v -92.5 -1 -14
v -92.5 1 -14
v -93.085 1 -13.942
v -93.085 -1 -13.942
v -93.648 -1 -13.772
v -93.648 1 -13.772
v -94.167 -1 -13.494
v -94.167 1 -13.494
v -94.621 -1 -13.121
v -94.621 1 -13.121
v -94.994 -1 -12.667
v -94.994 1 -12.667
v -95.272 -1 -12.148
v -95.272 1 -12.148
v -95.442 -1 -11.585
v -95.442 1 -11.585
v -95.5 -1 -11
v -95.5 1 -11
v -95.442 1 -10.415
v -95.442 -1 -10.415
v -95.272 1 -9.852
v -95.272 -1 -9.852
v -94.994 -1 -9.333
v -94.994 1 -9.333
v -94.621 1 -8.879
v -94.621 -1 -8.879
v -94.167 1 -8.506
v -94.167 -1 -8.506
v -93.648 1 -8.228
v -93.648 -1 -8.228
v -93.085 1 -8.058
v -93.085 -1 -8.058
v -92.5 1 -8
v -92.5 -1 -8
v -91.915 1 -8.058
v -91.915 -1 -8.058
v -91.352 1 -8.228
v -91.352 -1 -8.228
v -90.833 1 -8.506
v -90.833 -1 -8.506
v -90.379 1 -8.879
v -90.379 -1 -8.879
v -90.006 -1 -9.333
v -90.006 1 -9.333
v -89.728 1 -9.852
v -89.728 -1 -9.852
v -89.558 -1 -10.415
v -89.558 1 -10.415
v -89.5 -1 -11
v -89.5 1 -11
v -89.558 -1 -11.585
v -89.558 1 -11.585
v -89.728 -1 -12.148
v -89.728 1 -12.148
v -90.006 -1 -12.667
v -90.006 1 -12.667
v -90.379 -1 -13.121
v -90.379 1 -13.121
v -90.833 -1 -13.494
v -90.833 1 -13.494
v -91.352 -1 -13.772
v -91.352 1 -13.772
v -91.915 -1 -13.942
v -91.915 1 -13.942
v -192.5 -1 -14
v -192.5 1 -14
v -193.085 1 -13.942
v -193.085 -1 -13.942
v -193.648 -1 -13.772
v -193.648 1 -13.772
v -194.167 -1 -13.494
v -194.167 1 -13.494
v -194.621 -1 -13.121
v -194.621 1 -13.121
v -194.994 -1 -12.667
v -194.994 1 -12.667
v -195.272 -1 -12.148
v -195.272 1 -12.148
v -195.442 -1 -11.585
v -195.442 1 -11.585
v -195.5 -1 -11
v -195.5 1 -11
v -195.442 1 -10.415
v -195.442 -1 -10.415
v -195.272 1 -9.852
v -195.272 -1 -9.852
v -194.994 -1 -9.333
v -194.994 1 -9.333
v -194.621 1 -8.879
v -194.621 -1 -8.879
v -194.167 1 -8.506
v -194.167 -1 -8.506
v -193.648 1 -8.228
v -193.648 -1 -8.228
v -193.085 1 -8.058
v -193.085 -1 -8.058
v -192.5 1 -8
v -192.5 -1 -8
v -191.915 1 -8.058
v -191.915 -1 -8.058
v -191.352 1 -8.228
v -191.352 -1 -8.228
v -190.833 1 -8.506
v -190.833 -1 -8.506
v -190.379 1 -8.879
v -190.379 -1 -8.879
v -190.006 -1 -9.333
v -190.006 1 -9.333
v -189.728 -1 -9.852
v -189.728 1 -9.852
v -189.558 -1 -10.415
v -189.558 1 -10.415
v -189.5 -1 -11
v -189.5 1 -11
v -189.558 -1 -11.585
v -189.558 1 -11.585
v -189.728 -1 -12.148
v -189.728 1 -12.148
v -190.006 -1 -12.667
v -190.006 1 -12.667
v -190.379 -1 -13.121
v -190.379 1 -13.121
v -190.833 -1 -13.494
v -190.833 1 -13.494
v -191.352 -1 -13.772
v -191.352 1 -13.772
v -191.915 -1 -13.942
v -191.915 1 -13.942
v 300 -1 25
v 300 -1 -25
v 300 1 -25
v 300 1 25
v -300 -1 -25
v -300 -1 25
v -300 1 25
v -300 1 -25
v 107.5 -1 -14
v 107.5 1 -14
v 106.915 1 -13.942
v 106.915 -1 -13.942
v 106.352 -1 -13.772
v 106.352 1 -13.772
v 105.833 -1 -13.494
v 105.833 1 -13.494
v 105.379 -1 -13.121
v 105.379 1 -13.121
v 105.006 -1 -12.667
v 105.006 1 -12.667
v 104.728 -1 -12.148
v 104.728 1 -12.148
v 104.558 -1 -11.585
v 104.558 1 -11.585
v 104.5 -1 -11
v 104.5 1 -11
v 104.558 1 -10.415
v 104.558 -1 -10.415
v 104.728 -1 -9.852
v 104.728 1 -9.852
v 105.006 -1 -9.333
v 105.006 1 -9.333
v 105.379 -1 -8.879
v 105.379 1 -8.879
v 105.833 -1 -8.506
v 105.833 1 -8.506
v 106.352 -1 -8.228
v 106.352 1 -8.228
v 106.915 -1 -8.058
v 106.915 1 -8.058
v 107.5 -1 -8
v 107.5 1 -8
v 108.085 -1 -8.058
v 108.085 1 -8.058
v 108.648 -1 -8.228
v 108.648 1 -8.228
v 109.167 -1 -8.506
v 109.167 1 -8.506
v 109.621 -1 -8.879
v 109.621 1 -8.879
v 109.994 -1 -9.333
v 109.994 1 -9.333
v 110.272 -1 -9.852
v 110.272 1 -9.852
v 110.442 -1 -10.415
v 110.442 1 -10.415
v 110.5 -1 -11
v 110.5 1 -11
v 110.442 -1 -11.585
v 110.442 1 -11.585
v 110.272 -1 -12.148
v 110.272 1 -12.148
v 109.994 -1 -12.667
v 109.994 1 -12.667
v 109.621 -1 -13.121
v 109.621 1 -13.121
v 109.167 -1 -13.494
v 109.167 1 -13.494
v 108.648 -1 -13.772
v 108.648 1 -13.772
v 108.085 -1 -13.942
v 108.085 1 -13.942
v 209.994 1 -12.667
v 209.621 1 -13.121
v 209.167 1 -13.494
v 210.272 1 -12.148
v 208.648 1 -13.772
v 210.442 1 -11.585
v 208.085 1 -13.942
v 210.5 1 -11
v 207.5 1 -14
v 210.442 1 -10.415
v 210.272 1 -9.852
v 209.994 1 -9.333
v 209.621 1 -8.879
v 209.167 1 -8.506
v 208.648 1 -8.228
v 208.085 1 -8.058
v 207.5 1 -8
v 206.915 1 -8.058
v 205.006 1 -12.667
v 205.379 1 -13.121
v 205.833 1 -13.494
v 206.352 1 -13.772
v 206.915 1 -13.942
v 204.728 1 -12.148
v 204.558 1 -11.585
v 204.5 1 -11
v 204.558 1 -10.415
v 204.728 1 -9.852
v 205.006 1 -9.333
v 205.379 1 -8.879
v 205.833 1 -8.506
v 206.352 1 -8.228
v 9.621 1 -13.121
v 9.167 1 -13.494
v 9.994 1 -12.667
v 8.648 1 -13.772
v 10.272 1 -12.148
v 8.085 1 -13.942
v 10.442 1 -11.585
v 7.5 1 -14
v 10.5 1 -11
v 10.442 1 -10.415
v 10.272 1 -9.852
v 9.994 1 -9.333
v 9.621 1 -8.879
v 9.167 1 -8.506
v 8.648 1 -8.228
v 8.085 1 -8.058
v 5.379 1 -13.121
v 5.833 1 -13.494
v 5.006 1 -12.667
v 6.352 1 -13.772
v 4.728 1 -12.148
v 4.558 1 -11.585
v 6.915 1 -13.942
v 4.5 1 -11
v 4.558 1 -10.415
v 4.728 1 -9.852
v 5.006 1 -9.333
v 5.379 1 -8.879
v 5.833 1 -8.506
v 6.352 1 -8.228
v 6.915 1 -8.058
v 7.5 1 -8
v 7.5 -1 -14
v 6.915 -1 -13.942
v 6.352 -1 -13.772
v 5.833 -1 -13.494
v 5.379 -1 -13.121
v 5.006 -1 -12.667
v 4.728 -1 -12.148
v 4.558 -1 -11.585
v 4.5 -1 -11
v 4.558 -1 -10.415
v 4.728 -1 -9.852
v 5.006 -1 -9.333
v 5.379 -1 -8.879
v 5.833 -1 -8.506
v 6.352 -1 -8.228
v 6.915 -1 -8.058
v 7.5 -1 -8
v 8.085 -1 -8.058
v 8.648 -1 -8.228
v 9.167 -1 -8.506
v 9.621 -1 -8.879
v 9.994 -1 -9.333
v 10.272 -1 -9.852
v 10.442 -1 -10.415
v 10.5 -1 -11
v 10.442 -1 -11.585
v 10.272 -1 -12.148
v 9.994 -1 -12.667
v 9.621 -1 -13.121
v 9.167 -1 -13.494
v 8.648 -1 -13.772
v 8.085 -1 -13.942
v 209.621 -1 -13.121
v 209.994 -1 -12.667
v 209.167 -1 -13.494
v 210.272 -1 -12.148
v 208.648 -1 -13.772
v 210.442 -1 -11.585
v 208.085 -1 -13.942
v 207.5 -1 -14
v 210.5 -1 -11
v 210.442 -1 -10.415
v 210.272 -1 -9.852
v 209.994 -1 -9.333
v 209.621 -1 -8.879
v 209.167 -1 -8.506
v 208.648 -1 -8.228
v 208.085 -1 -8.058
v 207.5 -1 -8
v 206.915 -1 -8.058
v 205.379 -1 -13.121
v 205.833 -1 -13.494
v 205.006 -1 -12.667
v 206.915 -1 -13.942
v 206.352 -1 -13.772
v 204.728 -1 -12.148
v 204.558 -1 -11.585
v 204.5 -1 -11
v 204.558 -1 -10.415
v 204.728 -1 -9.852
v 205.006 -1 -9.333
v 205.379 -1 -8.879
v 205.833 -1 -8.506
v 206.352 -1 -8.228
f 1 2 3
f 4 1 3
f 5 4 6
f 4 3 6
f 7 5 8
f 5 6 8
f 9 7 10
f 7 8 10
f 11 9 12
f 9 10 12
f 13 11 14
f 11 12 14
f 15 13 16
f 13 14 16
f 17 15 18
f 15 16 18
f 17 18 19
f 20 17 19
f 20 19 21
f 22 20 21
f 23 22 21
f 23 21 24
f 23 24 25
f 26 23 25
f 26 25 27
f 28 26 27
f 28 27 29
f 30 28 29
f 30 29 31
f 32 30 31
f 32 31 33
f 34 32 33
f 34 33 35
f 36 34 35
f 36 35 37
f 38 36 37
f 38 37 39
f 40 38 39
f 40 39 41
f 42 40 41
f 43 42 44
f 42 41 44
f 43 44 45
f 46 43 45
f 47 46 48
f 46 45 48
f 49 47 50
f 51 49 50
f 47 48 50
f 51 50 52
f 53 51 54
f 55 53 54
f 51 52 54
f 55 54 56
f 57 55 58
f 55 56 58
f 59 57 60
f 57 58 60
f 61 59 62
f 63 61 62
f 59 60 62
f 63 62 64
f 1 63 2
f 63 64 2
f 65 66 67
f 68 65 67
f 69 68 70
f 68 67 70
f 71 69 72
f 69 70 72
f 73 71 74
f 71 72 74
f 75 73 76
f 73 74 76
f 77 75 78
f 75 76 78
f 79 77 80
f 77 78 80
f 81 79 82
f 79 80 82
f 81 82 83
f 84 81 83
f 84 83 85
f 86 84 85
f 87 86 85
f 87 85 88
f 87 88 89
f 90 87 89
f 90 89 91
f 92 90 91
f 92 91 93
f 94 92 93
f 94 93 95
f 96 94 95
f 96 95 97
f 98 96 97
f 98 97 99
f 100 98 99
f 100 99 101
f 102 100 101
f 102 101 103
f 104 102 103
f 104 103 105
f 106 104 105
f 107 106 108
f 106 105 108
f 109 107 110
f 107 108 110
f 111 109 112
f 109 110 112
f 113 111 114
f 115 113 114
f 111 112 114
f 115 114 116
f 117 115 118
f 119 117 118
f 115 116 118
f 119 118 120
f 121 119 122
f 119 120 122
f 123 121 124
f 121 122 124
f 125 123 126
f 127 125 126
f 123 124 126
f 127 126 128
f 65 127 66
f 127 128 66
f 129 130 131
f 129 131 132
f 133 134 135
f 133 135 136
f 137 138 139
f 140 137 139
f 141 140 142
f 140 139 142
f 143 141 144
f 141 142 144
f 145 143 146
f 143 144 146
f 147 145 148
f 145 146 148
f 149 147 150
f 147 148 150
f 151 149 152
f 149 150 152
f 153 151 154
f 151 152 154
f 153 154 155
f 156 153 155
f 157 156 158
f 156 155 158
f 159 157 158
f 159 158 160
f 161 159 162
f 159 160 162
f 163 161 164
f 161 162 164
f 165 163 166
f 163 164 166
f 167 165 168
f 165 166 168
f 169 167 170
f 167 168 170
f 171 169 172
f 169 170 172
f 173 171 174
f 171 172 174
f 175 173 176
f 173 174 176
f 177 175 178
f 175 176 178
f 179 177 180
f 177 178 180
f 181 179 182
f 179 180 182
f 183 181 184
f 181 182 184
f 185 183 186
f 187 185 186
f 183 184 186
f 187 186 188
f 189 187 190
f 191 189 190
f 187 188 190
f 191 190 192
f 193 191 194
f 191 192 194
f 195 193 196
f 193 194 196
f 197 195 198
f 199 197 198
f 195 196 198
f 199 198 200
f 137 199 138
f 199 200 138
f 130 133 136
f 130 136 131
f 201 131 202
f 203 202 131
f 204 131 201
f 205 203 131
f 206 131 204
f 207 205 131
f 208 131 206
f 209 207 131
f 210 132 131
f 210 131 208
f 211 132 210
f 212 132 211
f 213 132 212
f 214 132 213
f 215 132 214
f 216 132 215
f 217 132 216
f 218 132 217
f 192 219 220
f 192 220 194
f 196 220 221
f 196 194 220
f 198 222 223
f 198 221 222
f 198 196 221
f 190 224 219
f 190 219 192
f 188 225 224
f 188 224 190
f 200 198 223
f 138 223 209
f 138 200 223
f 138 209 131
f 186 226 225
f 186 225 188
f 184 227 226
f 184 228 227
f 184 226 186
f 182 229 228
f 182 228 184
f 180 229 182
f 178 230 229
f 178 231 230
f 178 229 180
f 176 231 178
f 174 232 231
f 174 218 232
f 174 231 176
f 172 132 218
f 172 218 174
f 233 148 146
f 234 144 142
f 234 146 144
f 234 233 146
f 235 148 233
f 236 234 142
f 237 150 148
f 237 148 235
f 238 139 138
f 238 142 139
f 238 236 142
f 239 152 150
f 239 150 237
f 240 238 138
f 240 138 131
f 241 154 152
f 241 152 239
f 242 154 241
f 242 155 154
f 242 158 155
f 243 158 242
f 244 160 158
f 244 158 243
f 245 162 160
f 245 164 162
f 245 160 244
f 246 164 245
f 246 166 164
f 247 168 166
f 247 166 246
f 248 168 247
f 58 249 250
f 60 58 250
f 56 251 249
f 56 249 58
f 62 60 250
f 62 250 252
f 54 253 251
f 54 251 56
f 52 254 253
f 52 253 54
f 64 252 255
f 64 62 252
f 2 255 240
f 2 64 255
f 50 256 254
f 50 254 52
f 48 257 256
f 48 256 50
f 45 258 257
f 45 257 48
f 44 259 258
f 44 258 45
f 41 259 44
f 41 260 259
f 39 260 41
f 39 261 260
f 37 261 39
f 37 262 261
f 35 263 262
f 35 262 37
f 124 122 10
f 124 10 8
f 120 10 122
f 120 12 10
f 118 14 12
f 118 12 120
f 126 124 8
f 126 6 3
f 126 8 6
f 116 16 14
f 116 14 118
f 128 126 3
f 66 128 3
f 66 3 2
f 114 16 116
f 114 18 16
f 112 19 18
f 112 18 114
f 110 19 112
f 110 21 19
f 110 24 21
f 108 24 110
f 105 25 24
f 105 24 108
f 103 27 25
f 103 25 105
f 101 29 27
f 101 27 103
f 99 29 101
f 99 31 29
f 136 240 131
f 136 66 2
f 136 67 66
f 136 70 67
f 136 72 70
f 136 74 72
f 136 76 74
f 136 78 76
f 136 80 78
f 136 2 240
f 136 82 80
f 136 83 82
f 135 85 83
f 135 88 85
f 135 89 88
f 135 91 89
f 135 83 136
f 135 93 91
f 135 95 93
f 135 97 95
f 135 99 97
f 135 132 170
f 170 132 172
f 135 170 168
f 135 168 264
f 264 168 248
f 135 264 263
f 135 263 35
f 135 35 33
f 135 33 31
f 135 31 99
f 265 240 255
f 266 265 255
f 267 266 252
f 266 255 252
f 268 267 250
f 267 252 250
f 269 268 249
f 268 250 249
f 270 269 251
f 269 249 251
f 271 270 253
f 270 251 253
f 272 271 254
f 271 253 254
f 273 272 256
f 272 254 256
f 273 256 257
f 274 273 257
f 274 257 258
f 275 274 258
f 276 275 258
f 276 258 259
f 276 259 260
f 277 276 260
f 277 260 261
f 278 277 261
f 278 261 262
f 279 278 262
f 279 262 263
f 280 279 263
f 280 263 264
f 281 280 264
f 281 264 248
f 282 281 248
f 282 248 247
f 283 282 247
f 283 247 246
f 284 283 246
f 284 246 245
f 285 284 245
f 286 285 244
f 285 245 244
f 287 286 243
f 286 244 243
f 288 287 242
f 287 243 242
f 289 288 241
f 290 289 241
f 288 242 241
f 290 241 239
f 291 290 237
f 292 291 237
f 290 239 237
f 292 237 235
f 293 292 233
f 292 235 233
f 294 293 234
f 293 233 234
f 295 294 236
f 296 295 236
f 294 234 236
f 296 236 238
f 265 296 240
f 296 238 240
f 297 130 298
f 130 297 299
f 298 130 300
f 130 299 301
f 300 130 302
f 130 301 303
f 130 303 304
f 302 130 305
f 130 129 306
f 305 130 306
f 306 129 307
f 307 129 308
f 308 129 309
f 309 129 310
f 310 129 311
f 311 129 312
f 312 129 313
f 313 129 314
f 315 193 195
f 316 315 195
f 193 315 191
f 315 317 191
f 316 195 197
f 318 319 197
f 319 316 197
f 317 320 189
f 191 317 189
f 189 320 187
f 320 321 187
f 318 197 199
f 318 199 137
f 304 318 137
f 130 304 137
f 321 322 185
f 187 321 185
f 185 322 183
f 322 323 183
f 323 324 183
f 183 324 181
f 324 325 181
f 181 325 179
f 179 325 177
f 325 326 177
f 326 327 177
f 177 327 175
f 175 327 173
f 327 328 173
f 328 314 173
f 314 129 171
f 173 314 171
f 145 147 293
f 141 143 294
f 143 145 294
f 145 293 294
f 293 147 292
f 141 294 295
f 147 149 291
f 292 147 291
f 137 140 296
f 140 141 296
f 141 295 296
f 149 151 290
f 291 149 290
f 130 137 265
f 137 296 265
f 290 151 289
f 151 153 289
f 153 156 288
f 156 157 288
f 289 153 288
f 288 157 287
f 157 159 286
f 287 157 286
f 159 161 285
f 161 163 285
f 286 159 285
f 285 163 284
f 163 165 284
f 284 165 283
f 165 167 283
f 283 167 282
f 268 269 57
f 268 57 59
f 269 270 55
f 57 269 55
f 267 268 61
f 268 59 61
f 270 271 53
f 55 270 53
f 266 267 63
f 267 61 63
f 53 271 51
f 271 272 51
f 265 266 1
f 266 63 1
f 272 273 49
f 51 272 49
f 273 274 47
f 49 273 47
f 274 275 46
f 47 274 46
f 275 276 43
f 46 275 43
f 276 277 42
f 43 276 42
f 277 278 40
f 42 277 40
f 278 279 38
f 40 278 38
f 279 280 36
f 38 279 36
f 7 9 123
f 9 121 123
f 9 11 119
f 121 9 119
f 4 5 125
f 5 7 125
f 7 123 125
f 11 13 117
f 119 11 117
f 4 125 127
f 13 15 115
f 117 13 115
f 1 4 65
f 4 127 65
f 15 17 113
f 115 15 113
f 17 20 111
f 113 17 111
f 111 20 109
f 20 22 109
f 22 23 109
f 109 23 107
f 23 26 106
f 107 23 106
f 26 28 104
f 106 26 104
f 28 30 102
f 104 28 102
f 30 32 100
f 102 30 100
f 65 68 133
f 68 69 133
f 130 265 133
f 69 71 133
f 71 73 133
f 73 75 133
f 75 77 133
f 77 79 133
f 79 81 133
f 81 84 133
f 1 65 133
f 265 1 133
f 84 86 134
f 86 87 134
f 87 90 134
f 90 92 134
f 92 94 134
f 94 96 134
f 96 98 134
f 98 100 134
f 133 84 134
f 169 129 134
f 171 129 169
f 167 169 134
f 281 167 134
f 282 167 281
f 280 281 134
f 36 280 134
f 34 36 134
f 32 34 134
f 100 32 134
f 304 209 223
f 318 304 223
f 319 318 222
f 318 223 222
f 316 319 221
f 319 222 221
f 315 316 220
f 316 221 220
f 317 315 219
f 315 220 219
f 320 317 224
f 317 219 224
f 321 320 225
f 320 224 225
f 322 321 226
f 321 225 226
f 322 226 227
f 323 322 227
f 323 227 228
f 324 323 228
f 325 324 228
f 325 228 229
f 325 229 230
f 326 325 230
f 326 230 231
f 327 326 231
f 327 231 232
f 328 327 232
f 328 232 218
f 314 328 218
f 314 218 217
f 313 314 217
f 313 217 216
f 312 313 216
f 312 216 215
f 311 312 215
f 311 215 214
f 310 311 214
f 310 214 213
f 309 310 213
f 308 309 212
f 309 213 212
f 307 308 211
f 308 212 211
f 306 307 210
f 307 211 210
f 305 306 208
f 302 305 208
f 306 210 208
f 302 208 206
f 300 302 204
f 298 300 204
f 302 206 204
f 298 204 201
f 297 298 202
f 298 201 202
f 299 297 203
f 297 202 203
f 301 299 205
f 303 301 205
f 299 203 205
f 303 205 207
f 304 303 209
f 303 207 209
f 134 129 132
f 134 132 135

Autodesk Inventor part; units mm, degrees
ref_plane "YZ Plane" through (0, 0, 0) normal (1, 0, 0) x (0, 1, 0)
ref_plane "XZ Plane" through (0, 0, 0) normal (0, 1, 0) x (-1, 0, 0)
ref_plane "XY Plane" through (0, 0, 0) normal (0, 0, 1) x (1, 0, 0)
sketch "Sketch1" plane through (0, 0, 0) normal (0, 1, 0) x (-1, 0, 0)
  line L0 (-300, 25) -> (300, 25)
  line L1 (300, 25) -> (300, -25)
  line L2 (300, -25) -> (-300, -25)
  line L3 (-300, -25) -> (-300, 25)
  line L4 (-300, 25) -> (300, -25) construction
  line L5 (300, 25) -> (-300, -25) construction
  point P0 (0, 0)
  dimension "d0" = 600
  dimension "d1" = 50
extrude "Plate1" add sketch "Sketch1" along normal mid plane 2
sketch "Sketch2" plane through (0, -1, 0) normal (0, -1, 0) x (1, 0, 0)
  circle A0 centre (-192.5, -11) radius 2.5 projected
  circle A1 centre (-92.5, -11) radius 2.5 projected
  circle A2 centre (7.5, -11) radius 2.5 projected
  line L0 (300, 25) -> (-300, 25) projected
  line L1 (-300, 25) -> (-300, -25) projected
  line L2 (-300, -25) -> (300, -25) projected
  line L3 (300, -25) -> (300, 25) projected
  circle A3 centre (107.5, -11) radius 2.5 projected
  circle A4 centre (207.5, -11) radius 2.5 projected
  point P0 (0, 0)
hole "Hole1" at (-192.5, -1, -11) at (-92.5, -1, -11) at (7.5, -1, -11) at (107.5, -1, -11) at (207.5, -1, -11) direction (0, 1, 0) diameter 6 end through all
equation "\"d8\" = Thickness"
equation "\"d2\" = Thickness"
equation "\"BendRadius\" = Thickness"
equation "\"BendReliefWidth\" = Thickness"
equation "\"BendReliefDepth\" = 0.5 * Thickness"
equation "\"CornerReliefSize\" = 4 * Thickness"
equation "\"MinimumRemnant\" = 2 * Thickness"
equation "\"TransitionRadius\" = BendRadius"
equation "\"JacobiRadiusSize\" = BendRadius"
equation "\"GapSize\" = Thickness"
equation "\"Thickness\" = 2"
properties part number "HCMUTE-CDT23-BTC-VND" material "PMMA Plastic"
